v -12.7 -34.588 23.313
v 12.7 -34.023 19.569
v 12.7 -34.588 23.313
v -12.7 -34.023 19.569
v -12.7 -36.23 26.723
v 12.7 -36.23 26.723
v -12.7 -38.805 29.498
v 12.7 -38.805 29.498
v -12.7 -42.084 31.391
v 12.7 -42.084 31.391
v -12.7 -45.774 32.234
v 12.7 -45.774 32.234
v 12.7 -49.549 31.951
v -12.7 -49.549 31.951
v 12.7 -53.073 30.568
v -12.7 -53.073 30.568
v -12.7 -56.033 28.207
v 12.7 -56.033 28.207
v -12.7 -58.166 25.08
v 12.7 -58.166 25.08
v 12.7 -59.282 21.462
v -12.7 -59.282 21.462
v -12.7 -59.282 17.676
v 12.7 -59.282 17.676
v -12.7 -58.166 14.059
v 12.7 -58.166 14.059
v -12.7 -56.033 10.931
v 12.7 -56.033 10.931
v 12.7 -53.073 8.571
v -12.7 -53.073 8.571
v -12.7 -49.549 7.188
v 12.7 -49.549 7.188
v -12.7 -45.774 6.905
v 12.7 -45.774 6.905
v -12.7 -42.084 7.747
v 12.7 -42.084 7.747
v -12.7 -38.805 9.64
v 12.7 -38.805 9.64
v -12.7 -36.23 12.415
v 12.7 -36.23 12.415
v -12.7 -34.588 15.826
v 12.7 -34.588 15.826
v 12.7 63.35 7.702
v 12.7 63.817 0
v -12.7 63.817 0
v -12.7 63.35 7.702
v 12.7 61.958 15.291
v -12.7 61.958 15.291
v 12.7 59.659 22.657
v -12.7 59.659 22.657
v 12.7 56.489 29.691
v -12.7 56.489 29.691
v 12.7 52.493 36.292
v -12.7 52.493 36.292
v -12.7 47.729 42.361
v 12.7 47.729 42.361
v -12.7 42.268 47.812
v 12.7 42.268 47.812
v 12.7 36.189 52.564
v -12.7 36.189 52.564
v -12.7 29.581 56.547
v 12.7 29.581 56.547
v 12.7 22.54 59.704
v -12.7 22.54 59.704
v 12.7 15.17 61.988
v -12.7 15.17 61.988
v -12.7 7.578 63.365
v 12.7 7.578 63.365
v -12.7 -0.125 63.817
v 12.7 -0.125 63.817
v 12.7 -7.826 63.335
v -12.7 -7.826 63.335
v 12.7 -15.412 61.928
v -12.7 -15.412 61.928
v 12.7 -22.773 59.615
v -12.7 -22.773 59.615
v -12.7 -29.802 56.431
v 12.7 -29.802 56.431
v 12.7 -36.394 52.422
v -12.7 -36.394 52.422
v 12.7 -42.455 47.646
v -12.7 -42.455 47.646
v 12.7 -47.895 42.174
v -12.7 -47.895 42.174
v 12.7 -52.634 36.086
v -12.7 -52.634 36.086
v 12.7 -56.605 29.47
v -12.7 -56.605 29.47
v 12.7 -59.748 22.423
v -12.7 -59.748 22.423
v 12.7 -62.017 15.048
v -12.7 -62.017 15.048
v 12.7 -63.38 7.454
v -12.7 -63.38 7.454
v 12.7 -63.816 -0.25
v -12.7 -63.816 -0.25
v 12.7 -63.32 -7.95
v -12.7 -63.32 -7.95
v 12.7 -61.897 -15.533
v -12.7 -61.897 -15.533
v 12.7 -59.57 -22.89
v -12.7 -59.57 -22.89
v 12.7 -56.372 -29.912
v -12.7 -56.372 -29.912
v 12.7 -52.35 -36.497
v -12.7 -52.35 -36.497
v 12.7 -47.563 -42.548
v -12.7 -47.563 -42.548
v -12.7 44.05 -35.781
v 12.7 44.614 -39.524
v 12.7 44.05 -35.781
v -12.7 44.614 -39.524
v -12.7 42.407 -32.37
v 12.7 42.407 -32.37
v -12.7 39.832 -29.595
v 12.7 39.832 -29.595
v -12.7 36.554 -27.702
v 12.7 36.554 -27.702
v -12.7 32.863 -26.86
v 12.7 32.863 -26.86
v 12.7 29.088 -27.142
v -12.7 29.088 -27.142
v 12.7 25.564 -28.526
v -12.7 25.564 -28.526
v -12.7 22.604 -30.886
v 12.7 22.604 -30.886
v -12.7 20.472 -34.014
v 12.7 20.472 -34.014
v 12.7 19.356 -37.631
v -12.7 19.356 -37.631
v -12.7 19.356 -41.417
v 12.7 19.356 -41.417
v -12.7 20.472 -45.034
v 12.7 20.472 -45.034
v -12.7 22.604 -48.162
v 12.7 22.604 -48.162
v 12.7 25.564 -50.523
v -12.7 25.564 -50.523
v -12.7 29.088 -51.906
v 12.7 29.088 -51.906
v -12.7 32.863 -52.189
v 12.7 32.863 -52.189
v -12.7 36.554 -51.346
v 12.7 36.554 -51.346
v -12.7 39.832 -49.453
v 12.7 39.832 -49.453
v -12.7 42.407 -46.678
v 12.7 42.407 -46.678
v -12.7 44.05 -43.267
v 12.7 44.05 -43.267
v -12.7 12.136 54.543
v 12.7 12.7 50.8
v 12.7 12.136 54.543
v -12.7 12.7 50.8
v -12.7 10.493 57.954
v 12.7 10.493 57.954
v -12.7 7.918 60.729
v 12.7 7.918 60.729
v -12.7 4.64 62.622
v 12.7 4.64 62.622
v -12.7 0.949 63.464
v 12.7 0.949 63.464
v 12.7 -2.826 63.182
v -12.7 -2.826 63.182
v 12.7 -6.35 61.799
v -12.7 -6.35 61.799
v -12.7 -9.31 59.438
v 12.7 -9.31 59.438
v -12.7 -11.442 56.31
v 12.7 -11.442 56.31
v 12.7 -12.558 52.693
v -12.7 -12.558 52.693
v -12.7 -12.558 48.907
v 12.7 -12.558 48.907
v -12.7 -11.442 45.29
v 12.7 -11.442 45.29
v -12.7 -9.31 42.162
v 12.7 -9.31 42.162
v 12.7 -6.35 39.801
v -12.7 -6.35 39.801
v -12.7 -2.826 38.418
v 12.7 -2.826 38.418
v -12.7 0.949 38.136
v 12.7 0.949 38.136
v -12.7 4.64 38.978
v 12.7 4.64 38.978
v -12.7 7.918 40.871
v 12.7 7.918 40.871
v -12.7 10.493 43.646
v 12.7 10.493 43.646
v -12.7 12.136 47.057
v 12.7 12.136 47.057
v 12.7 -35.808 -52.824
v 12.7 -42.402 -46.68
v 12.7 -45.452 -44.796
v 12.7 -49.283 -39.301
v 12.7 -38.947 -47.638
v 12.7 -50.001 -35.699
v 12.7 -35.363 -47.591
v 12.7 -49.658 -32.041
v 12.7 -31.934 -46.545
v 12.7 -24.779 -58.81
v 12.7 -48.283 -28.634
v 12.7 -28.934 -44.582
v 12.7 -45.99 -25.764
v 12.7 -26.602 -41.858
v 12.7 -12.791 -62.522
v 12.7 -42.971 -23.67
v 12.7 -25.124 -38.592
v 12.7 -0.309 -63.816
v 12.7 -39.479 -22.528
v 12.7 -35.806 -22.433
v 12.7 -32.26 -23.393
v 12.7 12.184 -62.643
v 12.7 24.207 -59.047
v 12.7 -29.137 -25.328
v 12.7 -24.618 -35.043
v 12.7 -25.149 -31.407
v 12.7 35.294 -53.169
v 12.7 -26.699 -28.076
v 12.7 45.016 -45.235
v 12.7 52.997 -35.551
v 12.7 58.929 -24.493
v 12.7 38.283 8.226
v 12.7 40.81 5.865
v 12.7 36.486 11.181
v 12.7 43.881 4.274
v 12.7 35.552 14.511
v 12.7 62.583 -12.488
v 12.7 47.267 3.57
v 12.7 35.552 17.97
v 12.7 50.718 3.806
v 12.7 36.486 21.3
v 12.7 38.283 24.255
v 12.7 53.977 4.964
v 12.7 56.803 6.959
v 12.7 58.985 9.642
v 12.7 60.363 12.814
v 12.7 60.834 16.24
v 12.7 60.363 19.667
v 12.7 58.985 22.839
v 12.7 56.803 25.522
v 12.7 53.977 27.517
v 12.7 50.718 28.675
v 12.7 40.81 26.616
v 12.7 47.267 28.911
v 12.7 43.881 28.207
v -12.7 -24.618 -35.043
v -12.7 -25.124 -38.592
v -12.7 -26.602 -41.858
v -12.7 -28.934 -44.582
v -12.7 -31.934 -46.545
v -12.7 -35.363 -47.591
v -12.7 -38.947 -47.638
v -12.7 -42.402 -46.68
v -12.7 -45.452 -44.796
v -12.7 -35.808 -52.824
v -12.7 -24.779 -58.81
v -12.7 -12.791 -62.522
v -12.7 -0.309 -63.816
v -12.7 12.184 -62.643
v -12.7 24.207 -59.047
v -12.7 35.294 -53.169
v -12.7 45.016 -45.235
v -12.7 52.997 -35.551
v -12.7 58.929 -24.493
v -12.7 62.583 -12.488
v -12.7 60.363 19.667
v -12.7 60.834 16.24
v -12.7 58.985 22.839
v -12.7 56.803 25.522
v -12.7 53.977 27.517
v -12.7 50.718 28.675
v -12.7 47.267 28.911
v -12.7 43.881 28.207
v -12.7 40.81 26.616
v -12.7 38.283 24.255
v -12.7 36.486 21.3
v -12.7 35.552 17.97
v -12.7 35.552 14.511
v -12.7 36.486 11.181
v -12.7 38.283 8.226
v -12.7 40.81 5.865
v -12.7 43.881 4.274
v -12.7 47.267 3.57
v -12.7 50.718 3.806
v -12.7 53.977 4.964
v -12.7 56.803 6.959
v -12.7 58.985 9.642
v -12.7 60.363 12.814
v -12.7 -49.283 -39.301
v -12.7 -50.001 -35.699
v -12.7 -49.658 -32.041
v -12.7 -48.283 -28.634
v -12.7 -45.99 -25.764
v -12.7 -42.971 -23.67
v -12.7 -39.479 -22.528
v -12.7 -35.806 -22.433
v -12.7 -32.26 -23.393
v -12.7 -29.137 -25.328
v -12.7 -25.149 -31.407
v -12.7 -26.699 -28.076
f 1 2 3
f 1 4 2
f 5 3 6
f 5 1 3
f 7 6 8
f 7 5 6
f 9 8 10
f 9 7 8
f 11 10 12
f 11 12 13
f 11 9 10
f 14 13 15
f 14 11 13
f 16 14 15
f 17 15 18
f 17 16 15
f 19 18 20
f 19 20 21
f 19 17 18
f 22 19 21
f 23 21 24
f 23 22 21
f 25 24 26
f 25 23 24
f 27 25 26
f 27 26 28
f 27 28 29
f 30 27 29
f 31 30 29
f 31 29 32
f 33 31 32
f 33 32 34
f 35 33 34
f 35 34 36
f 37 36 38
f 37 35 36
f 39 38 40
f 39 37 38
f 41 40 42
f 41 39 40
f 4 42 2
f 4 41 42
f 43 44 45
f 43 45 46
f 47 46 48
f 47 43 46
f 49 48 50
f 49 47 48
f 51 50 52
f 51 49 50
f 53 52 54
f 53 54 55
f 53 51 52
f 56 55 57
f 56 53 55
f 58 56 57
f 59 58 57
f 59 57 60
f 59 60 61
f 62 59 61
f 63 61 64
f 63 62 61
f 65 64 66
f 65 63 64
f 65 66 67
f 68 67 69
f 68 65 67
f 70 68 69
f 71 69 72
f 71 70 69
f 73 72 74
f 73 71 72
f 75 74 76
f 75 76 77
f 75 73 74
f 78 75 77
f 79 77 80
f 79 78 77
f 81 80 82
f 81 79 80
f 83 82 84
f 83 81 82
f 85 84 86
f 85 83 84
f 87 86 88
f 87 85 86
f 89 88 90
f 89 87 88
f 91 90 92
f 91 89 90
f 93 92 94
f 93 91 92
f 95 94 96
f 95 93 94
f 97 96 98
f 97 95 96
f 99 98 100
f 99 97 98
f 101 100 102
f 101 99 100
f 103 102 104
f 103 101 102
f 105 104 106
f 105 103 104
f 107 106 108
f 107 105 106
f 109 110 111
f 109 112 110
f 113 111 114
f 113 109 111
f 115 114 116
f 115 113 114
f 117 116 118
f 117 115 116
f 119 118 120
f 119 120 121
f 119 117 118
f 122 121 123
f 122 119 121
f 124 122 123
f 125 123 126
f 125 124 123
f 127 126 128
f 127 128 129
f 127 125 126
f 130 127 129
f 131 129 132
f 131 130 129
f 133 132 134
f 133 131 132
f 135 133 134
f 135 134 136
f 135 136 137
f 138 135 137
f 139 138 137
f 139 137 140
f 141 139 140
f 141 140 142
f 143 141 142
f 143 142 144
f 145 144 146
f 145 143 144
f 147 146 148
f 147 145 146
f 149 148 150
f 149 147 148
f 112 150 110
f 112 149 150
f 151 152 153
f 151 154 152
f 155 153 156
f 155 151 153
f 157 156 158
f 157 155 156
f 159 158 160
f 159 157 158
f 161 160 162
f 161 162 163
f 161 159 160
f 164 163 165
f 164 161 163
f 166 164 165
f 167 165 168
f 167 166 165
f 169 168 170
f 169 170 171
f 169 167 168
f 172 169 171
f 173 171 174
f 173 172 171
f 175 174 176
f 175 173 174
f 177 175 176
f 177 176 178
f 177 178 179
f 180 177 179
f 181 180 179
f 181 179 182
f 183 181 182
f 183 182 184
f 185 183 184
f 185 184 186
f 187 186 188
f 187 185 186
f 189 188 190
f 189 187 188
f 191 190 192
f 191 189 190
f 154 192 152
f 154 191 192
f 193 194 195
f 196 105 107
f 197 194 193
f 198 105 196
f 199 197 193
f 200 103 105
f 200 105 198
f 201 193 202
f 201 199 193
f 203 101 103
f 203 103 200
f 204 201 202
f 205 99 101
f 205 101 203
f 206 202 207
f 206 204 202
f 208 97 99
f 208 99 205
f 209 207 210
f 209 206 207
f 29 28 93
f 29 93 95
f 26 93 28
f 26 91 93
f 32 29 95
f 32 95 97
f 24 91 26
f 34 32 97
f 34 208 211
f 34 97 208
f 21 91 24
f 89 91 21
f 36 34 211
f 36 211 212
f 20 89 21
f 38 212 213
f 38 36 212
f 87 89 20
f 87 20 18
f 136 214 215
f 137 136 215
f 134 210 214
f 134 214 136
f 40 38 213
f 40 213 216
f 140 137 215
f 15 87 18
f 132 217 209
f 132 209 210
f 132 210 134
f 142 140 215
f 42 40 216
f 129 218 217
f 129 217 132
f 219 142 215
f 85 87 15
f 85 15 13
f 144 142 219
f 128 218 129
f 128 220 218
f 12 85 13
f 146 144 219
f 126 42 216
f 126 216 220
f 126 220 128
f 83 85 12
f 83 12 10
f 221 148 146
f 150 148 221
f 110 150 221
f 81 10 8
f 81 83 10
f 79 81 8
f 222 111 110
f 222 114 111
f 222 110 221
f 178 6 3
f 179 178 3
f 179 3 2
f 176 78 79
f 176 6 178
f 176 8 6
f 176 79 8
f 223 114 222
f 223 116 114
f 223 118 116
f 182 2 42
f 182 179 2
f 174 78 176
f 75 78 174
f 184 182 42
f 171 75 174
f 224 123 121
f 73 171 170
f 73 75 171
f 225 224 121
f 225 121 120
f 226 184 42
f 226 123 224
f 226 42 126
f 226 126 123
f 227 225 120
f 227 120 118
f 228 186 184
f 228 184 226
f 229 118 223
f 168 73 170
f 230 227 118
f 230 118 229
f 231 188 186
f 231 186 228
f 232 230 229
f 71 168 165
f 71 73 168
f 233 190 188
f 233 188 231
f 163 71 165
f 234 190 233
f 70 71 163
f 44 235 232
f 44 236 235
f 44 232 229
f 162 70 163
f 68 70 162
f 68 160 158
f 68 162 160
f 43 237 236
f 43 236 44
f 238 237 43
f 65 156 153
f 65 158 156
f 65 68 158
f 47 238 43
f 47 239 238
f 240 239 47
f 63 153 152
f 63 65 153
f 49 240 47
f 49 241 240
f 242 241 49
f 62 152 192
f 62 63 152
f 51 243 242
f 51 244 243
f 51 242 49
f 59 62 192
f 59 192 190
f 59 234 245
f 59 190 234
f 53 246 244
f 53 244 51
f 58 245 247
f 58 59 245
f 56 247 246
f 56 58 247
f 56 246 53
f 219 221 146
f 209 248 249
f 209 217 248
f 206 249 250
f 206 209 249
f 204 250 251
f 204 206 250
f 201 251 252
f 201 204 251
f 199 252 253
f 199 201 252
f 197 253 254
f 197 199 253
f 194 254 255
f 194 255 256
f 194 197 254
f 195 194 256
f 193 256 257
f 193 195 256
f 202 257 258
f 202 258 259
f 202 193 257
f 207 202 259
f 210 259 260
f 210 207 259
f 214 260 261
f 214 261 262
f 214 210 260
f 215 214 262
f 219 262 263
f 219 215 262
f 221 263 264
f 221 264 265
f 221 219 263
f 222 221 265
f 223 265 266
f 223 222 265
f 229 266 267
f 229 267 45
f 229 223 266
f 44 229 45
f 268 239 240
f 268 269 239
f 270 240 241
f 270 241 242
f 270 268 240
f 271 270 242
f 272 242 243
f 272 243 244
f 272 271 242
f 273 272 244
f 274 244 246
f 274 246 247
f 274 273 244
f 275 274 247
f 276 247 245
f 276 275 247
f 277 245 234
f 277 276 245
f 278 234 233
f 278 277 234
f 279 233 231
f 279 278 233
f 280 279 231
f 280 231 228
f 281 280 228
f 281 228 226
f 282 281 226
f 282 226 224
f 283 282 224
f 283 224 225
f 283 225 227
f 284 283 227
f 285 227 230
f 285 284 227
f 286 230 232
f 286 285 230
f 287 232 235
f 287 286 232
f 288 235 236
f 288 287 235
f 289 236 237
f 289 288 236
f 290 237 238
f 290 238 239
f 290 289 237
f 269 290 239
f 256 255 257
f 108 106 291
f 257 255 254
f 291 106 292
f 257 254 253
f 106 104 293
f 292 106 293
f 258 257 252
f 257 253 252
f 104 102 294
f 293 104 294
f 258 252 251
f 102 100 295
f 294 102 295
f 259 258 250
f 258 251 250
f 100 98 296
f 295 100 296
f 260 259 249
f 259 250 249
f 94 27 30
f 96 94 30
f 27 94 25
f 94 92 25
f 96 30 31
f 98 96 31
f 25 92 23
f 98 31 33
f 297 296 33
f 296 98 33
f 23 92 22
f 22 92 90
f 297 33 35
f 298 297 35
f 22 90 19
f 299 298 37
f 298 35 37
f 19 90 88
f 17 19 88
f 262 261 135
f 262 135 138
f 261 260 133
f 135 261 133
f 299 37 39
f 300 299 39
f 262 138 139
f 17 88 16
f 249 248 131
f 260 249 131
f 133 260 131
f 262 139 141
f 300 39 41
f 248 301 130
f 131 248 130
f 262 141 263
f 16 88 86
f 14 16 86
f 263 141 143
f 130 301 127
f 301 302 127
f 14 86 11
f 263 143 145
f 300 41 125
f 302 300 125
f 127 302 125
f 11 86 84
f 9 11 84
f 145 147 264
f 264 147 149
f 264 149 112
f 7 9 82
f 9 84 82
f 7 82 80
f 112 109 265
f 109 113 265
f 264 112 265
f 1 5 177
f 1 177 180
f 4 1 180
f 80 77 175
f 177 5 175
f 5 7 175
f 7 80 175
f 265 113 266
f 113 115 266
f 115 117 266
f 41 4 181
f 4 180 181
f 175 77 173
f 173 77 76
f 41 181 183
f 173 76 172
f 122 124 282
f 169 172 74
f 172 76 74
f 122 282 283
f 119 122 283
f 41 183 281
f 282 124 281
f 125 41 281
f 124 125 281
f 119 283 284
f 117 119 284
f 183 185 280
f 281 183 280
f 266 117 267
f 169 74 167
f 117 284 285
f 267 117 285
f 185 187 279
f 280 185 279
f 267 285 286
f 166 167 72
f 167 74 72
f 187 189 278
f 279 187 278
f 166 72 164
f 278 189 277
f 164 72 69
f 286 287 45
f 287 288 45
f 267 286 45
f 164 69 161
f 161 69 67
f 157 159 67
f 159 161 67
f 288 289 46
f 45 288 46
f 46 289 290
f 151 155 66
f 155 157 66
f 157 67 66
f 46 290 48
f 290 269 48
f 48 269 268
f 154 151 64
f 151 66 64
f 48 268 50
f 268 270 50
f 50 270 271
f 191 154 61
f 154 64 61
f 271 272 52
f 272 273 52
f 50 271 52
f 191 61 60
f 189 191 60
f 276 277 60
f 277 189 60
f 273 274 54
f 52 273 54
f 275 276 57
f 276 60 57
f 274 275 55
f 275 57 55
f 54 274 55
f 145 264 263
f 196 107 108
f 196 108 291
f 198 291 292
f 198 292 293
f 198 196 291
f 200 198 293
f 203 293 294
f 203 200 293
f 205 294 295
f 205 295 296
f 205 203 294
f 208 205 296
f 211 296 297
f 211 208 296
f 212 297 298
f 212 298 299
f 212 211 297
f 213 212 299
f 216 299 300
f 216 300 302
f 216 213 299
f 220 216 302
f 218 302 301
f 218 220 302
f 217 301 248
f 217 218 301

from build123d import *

# Parameters (mm, degrees)
F0_R     = 12.7
F1_DEPTH = 12.7


with BuildPart() as f1:
    # F0 (on Right) → F1 (new body, symmetric)
    with BuildSketch(Plane.YZ):
        with BuildLine():
            ThreePointArc((-45.452309, -44.795775), (24.206988, -59.047401), (63.816721, 0))
            ThreePointArc((63.816721, 0), (-22.773388, 59.614987), (-47.563074, -42.547948))
            ThreePointArc((-47.563074, -42.547948), (-41.266422, -22.971946), (-24.618088, -35.042599))
            ThreePointArc((-24.618088, -35.042599), (-31.933601, -46.544655), (-45.452309, -44.795775))
        make_face()
        with Locations((31.913808, -39.524028)):
            Circle(F0_R, mode=Mode.SUBTRACT)
        with Locations((-46.723463, 19.569239)):
            Circle(F0_R, mode=Mode.SUBTRACT)
        with Locations((0, 50.8)):
            Circle(F0_R, mode=Mode.SUBTRACT)
        with Locations((48.134091, 16.240359)):
            Circle(F0_R, mode=Mode.SUBTRACT)
    extrude(amount=F1_DEPTH, both=True)


solid = f1.part
